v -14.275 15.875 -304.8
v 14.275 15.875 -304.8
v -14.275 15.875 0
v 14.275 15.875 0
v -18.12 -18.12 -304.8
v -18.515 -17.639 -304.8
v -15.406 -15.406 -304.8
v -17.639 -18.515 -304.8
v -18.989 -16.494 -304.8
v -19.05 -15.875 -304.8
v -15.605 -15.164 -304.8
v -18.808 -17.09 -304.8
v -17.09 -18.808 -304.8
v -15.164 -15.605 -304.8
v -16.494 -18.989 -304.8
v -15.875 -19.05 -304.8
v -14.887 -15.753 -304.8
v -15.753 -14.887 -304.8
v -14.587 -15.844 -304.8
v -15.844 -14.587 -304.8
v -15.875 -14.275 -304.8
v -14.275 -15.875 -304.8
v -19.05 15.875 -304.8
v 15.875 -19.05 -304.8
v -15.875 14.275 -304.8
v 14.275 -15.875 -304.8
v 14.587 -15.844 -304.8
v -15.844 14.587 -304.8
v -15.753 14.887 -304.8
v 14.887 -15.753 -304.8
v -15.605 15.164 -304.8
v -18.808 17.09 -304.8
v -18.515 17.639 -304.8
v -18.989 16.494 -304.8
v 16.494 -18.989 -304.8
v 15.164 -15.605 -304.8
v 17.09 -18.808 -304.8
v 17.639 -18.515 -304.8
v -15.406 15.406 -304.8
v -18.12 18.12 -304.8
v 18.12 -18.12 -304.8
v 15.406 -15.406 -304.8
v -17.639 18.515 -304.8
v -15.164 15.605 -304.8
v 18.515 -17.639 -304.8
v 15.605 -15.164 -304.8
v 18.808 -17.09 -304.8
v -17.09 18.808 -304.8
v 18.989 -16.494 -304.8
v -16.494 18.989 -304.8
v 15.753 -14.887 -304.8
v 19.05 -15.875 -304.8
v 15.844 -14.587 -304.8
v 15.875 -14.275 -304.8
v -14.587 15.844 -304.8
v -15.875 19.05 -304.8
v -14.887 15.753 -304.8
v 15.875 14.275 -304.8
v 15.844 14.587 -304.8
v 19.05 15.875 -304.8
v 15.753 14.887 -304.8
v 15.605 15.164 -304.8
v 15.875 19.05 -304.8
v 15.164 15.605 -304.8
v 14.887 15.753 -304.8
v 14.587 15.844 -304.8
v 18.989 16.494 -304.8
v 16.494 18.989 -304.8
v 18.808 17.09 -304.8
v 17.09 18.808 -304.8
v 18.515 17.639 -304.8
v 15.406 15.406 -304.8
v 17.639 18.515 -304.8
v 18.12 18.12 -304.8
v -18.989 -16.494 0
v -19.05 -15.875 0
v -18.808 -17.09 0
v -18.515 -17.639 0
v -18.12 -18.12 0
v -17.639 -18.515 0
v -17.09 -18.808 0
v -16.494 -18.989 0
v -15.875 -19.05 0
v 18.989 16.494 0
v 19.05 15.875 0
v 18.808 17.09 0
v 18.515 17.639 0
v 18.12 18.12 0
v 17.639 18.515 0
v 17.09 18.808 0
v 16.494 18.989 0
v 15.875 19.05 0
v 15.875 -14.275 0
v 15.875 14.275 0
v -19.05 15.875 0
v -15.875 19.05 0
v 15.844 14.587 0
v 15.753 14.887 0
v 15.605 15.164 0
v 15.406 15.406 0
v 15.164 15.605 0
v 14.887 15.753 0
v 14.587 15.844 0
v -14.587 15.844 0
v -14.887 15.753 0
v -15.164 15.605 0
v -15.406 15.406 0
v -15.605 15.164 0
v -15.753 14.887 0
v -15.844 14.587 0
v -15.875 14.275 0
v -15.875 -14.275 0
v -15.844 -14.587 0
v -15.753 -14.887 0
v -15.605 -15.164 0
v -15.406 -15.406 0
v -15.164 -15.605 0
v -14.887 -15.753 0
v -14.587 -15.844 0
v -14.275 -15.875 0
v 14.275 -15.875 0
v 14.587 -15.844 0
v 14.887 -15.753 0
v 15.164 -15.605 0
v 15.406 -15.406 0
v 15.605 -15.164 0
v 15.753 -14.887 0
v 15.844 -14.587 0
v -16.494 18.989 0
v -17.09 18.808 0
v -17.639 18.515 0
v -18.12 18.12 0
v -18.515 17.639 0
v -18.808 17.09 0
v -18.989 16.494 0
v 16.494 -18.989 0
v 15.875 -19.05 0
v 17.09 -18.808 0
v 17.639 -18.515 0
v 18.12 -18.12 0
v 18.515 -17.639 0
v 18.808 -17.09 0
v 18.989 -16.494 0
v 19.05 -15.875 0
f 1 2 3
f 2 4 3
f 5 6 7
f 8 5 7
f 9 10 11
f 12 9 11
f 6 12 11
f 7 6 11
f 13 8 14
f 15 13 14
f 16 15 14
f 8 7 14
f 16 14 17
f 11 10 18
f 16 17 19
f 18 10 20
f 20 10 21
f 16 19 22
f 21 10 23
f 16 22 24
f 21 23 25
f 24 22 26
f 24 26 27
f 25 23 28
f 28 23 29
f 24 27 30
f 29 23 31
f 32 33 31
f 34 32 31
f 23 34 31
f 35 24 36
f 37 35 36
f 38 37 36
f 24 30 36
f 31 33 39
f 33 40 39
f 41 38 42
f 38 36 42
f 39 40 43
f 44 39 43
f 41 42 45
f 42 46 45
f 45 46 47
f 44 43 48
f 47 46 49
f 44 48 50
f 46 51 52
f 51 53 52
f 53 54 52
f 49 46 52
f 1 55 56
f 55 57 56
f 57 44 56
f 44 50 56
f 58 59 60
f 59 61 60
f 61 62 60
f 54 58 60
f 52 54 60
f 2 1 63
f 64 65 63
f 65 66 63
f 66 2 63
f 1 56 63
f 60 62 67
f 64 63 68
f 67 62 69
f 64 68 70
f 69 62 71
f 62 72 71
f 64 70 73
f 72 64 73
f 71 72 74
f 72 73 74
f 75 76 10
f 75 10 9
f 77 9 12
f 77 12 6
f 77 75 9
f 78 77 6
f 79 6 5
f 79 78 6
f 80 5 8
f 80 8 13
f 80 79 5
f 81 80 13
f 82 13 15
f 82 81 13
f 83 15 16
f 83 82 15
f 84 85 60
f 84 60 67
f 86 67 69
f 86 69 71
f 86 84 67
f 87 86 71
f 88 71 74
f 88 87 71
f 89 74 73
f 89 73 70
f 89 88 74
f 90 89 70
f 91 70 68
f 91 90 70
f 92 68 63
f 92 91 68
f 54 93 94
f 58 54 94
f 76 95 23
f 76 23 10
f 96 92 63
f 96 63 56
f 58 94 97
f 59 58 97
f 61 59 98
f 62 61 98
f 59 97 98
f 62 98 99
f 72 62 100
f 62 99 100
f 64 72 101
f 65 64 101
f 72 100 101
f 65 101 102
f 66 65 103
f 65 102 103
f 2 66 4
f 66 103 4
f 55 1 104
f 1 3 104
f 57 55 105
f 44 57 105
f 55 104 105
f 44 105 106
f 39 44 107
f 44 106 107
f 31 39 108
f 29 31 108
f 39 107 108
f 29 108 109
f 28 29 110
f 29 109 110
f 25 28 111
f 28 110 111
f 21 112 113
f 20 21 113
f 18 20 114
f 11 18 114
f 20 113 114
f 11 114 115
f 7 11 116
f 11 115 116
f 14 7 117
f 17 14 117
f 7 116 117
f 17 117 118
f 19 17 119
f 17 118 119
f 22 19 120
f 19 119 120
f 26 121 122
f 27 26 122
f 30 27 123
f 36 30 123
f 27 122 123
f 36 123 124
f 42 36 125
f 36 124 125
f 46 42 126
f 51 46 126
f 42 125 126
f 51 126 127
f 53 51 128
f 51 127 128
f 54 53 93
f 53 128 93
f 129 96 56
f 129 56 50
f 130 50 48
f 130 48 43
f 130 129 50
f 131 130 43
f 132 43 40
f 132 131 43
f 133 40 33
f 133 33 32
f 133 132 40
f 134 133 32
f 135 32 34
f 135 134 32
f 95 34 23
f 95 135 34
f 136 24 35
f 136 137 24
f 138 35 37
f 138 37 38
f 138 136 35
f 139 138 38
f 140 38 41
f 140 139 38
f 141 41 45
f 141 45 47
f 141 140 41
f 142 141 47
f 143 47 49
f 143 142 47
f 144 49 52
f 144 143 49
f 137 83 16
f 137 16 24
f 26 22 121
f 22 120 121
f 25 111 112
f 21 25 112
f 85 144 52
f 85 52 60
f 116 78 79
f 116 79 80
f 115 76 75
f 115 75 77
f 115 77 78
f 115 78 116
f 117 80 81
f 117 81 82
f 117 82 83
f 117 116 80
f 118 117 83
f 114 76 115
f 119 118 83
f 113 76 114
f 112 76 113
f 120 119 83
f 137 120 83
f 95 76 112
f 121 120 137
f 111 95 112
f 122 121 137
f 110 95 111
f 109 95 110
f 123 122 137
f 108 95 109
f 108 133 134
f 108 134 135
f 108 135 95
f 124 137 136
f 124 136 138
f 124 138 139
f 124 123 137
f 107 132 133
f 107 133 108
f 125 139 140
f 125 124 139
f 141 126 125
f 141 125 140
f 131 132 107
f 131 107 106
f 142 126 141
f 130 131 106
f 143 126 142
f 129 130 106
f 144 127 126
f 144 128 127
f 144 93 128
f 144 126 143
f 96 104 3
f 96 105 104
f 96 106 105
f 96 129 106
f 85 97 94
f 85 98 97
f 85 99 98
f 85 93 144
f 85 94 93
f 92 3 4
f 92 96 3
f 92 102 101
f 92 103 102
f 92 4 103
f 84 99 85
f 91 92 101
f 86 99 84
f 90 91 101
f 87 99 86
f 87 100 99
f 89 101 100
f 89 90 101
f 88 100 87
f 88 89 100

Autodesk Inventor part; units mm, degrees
ref_plane "YZ Plane" through (0, 0, 0) normal (1, 0, 0) x (0, 1, 0)
ref_plane "XZ Plane" through (0, 0, 0) normal (0, 1, 0) x (-1, 0, 0)
ref_plane "XY Plane" through (0, 0, 0) normal (0, 0, 1) x (1, 0, 0)
sketch "Sketch1" plane through (0, 0, 0) normal (0, 0, 1) x (1, 0, 0)
  line L0 (-15.875, 14.2748) -> (-15.875, -14.2748)
  arc A0 (-14.2748, 15.875) -> (-15.875, 14.2748) centre (-14.2748, 14.2748) ccw
  line L1 (14.2748, 15.875) -> (-14.2748, 15.875)
  arc A1 (15.875, 14.2748) -> (14.2748, 15.875) centre (14.2748, 14.2748) ccw
  line L2 (15.875, -14.2748) -> (15.875, 14.2748)
  arc A2 (14.2748, -15.875) -> (15.875, -14.2748) centre (14.2748, -14.2748) ccw
  line L3 (-14.2748, -15.875) -> (14.2748, -15.875)
  arc A3 (-15.875, -14.2748) -> (-14.2748, -15.875) centre (-14.2748, -14.2748) ccw
  arc A4 (19.05, 15.875) -> (15.875, 19.05) centre (15.875, 15.875) ccw
  line L4 (15.875, 19.05) -> (-15.875, 19.05)
  arc A5 (-15.875, 19.05) -> (-19.05, 15.875) centre (-15.875, 15.875) ccw
  line L5 (-19.05, 15.875) -> (-19.05, -15.875)
  arc A6 (-19.05, -15.875) -> (-15.875, -19.05) centre (-15.875, -15.875) ccw
  line L6 (-15.875, -19.05) -> (15.875, -19.05)
  arc A7 (15.875, -19.05) -> (19.05, -15.875) centre (15.875, -15.875) ccw
  line L7 (19.05, -15.875) -> (19.05, 15.875)
  point P0 (0, 0)
extrude "Extrusion1" add sketch "Sketch1" against normal blind 304.8
properties part number "9700"
